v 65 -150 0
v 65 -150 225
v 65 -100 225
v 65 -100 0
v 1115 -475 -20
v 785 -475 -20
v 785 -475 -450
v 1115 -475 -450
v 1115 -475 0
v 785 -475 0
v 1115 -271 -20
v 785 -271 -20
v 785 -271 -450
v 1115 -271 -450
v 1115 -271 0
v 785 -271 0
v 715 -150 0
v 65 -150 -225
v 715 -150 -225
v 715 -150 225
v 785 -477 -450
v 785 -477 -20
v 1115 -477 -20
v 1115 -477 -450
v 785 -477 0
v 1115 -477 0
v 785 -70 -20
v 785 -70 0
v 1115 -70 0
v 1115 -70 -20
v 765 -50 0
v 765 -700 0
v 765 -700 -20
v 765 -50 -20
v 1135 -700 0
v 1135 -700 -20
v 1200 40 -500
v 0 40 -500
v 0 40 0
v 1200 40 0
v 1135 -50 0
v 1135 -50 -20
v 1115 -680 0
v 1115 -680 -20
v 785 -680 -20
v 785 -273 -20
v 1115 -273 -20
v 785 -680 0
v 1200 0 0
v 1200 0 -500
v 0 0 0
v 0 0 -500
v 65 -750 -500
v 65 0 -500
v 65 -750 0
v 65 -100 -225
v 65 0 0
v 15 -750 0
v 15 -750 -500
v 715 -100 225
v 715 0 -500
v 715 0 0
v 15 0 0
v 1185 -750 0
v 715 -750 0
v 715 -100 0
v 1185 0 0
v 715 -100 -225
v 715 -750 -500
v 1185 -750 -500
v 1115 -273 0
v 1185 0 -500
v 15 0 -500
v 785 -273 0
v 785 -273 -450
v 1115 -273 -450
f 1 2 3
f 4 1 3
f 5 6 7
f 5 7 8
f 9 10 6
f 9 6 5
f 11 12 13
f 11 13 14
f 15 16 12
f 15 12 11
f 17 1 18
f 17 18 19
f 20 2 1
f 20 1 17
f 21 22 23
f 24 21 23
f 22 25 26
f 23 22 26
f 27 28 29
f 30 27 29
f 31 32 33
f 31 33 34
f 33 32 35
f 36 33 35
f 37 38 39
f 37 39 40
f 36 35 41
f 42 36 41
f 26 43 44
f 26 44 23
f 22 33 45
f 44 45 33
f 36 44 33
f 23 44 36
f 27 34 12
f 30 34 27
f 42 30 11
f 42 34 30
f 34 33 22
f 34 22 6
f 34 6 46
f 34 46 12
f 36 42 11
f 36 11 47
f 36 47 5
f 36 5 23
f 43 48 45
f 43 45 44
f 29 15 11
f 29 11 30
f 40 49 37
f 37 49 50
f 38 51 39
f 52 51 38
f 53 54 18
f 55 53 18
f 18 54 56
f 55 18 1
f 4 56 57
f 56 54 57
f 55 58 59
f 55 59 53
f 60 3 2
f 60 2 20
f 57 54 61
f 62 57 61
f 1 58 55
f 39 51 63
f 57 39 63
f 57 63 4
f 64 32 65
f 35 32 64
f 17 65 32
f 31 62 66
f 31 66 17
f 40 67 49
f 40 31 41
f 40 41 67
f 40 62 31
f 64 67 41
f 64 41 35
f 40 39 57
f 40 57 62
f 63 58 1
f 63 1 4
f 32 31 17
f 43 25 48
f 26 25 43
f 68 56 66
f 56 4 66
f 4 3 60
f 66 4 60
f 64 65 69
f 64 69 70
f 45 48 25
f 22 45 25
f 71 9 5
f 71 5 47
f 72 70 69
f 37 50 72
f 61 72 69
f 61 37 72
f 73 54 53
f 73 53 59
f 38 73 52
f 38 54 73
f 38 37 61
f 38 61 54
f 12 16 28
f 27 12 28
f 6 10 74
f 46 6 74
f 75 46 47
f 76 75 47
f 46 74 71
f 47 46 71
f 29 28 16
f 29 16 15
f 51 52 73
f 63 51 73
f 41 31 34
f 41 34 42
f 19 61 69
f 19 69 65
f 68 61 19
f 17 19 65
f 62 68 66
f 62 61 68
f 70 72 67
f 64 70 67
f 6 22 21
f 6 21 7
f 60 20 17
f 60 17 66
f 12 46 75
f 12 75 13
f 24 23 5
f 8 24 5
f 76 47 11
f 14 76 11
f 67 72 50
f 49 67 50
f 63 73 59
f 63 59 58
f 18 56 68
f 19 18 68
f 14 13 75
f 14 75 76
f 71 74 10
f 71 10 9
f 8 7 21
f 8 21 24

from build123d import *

# Parameters (mm, degrees)
SKETCH1_W               = 1200
SKETCH1_H               = 500
BOSS_EXTRUDE1_DEPTH     = 40
SKETCH2_W               = 50
SKETCH2_H               = 500
BOSS_EXTRUDE2_DEPTH     = 750
SKETCH3_W               = 650
SKETCH3_H               = 50
BOSS_EXTRUDE3_DEPTH     = 225
SKETCH4_W               = 50
SKETCH4_H               = 500
BOSS_EXTRUDE4_DEPTH     = 750
SKETCH5_W               = 370
SKETCH5_H               = 50
BOSS_EXTRUDE5_DEPTH     = 500
SKETCH6_W               = 370
SKETCH6_H               = 650
BOSS_EXTRUDE6_DEPTH     = 50
SKETCH7_W               = 330
SKETCH7_H               = 610
BOSS_EXTRUDE7_DEPTH     = 450
SKETCH13_W              = 370
SKETCH13_H              = 650
SKETCH13_W_2            = 330
SKETCH13_H_2            = 610
BOSS_EXTRUDE9_DEPTH     = 450
SKETCH13_3_W            = 370
SKETCH13_3_H            = 650
SKETCH13_3_W_2          = 330
SKETCH13_3_H_2          = 610
CUT_EXTRUDE1_DEPTH      = 20
SKETCH14_W              = 330
SKETCH14_H              = 2
CUT_EXTRUDE_THIN1_DEPTH = 450


with BuildPart() as part:
    # Sketch1 → Boss-Extrude1 (new body)
    with BuildSketch(Plane(origin=(0, 0, 0), x_dir=(1, 0, 0), z_dir=(0, 1, 0))):
        with Locations((600, 250)):
            Rectangle(SKETCH1_W, SKETCH1_H)
    extrude(amount=BOSS_EXTRUDE1_DEPTH)

    # Sketch2 → Boss-Extrude2 (add)
    with BuildSketch(Plane.XZ):
        with Locations((40, -250)):
            Rectangle(SKETCH2_W, SKETCH2_H)
        with Locations((1160, -250)):
            Rectangle(SKETCH2_W, SKETCH2_H)
    extrude(amount=BOSS_EXTRUDE2_DEPTH)

    # Sketch3 → Boss-Extrude3 (add, symmetric)
    with BuildSketch(Plane.XY):
        with Locations((390, -125)):
            Rectangle(SKETCH3_W, SKETCH3_H)
    extrude(amount=BOSS_EXTRUDE3_DEPTH, both=True)

    # Sketch4 → Boss-Extrude4 (add)
    with BuildSketch(Plane.XZ):
        with Locations((740, -250)):
            Rectangle(SKETCH4_W, SKETCH4_H)
    extrude(amount=BOSS_EXTRUDE4_DEPTH)

    # Sketch5 → Boss-Extrude5 (add)
    with BuildSketch(Plane.XY):
        with Locations((950, -25)):
            Rectangle(SKETCH5_W, SKETCH5_H)
        with Locations((950, -725)):
            Rectangle(SKETCH5_W, SKETCH5_H)
    extrude(amount=-BOSS_EXTRUDE5_DEPTH)

    # Sketch6 → Boss-Extrude6 (add)
    with BuildSketch(Plane(origin=(0, 0, -500), x_dir=(-1, 0, 0), z_dir=(0, 0, -1))):
        with Locations((-950, -375)):
            Rectangle(SKETCH6_W, SKETCH6_H)
    extrude(amount=-BOSS_EXTRUDE6_DEPTH)

    # Sketch7 → Boss-Extrude7 (add)
    with BuildSketch(Plane.XY):
        with Locations((950, -375)):
            Rectangle(SKETCH7_W, SKETCH7_H)
    extrude(amount=-BOSS_EXTRUDE7_DEPTH)

    # Sketch13 → Boss-Extrude9 (add)
    with BuildSketch(Plane.XY):
        with Locations((950, -375)):
            Rectangle(SKETCH13_W, SKETCH13_H)
        with Locations((950, -375)):
            Rectangle(SKETCH13_W_2, SKETCH13_H_2, mode=Mode.SUBTRACT)
    extrude(amount=-BOSS_EXTRUDE9_DEPTH)

    # Sketch13<3> → Cut-Extrude1 (cut)
    with BuildSketch(Plane.XY):
        with Locations((950, -375)):
            Rectangle(SKETCH13_3_W, SKETCH13_3_H)
        with Locations((950, -375)):
            Rectangle(SKETCH13_3_W_2, SKETCH13_3_H_2, mode=Mode.SUBTRACT)
    extrude(amount=-CUT_EXTRUDE1_DEPTH, mode=Mode.SUBTRACT)

    # Sketch14 → Cut-Extrude-Thin1 (cut)
    with BuildSketch(Plane.XY):
        with Locations((950, -272)):
            Rectangle(SKETCH14_W, SKETCH14_H)
        with Locations((950, -476)):
            Rectangle(SKETCH14_W, SKETCH14_H)
    extrude(amount=-CUT_EXTRUDE_THIN1_DEPTH, mode=Mode.SUBTRACT)


solid = part.part
